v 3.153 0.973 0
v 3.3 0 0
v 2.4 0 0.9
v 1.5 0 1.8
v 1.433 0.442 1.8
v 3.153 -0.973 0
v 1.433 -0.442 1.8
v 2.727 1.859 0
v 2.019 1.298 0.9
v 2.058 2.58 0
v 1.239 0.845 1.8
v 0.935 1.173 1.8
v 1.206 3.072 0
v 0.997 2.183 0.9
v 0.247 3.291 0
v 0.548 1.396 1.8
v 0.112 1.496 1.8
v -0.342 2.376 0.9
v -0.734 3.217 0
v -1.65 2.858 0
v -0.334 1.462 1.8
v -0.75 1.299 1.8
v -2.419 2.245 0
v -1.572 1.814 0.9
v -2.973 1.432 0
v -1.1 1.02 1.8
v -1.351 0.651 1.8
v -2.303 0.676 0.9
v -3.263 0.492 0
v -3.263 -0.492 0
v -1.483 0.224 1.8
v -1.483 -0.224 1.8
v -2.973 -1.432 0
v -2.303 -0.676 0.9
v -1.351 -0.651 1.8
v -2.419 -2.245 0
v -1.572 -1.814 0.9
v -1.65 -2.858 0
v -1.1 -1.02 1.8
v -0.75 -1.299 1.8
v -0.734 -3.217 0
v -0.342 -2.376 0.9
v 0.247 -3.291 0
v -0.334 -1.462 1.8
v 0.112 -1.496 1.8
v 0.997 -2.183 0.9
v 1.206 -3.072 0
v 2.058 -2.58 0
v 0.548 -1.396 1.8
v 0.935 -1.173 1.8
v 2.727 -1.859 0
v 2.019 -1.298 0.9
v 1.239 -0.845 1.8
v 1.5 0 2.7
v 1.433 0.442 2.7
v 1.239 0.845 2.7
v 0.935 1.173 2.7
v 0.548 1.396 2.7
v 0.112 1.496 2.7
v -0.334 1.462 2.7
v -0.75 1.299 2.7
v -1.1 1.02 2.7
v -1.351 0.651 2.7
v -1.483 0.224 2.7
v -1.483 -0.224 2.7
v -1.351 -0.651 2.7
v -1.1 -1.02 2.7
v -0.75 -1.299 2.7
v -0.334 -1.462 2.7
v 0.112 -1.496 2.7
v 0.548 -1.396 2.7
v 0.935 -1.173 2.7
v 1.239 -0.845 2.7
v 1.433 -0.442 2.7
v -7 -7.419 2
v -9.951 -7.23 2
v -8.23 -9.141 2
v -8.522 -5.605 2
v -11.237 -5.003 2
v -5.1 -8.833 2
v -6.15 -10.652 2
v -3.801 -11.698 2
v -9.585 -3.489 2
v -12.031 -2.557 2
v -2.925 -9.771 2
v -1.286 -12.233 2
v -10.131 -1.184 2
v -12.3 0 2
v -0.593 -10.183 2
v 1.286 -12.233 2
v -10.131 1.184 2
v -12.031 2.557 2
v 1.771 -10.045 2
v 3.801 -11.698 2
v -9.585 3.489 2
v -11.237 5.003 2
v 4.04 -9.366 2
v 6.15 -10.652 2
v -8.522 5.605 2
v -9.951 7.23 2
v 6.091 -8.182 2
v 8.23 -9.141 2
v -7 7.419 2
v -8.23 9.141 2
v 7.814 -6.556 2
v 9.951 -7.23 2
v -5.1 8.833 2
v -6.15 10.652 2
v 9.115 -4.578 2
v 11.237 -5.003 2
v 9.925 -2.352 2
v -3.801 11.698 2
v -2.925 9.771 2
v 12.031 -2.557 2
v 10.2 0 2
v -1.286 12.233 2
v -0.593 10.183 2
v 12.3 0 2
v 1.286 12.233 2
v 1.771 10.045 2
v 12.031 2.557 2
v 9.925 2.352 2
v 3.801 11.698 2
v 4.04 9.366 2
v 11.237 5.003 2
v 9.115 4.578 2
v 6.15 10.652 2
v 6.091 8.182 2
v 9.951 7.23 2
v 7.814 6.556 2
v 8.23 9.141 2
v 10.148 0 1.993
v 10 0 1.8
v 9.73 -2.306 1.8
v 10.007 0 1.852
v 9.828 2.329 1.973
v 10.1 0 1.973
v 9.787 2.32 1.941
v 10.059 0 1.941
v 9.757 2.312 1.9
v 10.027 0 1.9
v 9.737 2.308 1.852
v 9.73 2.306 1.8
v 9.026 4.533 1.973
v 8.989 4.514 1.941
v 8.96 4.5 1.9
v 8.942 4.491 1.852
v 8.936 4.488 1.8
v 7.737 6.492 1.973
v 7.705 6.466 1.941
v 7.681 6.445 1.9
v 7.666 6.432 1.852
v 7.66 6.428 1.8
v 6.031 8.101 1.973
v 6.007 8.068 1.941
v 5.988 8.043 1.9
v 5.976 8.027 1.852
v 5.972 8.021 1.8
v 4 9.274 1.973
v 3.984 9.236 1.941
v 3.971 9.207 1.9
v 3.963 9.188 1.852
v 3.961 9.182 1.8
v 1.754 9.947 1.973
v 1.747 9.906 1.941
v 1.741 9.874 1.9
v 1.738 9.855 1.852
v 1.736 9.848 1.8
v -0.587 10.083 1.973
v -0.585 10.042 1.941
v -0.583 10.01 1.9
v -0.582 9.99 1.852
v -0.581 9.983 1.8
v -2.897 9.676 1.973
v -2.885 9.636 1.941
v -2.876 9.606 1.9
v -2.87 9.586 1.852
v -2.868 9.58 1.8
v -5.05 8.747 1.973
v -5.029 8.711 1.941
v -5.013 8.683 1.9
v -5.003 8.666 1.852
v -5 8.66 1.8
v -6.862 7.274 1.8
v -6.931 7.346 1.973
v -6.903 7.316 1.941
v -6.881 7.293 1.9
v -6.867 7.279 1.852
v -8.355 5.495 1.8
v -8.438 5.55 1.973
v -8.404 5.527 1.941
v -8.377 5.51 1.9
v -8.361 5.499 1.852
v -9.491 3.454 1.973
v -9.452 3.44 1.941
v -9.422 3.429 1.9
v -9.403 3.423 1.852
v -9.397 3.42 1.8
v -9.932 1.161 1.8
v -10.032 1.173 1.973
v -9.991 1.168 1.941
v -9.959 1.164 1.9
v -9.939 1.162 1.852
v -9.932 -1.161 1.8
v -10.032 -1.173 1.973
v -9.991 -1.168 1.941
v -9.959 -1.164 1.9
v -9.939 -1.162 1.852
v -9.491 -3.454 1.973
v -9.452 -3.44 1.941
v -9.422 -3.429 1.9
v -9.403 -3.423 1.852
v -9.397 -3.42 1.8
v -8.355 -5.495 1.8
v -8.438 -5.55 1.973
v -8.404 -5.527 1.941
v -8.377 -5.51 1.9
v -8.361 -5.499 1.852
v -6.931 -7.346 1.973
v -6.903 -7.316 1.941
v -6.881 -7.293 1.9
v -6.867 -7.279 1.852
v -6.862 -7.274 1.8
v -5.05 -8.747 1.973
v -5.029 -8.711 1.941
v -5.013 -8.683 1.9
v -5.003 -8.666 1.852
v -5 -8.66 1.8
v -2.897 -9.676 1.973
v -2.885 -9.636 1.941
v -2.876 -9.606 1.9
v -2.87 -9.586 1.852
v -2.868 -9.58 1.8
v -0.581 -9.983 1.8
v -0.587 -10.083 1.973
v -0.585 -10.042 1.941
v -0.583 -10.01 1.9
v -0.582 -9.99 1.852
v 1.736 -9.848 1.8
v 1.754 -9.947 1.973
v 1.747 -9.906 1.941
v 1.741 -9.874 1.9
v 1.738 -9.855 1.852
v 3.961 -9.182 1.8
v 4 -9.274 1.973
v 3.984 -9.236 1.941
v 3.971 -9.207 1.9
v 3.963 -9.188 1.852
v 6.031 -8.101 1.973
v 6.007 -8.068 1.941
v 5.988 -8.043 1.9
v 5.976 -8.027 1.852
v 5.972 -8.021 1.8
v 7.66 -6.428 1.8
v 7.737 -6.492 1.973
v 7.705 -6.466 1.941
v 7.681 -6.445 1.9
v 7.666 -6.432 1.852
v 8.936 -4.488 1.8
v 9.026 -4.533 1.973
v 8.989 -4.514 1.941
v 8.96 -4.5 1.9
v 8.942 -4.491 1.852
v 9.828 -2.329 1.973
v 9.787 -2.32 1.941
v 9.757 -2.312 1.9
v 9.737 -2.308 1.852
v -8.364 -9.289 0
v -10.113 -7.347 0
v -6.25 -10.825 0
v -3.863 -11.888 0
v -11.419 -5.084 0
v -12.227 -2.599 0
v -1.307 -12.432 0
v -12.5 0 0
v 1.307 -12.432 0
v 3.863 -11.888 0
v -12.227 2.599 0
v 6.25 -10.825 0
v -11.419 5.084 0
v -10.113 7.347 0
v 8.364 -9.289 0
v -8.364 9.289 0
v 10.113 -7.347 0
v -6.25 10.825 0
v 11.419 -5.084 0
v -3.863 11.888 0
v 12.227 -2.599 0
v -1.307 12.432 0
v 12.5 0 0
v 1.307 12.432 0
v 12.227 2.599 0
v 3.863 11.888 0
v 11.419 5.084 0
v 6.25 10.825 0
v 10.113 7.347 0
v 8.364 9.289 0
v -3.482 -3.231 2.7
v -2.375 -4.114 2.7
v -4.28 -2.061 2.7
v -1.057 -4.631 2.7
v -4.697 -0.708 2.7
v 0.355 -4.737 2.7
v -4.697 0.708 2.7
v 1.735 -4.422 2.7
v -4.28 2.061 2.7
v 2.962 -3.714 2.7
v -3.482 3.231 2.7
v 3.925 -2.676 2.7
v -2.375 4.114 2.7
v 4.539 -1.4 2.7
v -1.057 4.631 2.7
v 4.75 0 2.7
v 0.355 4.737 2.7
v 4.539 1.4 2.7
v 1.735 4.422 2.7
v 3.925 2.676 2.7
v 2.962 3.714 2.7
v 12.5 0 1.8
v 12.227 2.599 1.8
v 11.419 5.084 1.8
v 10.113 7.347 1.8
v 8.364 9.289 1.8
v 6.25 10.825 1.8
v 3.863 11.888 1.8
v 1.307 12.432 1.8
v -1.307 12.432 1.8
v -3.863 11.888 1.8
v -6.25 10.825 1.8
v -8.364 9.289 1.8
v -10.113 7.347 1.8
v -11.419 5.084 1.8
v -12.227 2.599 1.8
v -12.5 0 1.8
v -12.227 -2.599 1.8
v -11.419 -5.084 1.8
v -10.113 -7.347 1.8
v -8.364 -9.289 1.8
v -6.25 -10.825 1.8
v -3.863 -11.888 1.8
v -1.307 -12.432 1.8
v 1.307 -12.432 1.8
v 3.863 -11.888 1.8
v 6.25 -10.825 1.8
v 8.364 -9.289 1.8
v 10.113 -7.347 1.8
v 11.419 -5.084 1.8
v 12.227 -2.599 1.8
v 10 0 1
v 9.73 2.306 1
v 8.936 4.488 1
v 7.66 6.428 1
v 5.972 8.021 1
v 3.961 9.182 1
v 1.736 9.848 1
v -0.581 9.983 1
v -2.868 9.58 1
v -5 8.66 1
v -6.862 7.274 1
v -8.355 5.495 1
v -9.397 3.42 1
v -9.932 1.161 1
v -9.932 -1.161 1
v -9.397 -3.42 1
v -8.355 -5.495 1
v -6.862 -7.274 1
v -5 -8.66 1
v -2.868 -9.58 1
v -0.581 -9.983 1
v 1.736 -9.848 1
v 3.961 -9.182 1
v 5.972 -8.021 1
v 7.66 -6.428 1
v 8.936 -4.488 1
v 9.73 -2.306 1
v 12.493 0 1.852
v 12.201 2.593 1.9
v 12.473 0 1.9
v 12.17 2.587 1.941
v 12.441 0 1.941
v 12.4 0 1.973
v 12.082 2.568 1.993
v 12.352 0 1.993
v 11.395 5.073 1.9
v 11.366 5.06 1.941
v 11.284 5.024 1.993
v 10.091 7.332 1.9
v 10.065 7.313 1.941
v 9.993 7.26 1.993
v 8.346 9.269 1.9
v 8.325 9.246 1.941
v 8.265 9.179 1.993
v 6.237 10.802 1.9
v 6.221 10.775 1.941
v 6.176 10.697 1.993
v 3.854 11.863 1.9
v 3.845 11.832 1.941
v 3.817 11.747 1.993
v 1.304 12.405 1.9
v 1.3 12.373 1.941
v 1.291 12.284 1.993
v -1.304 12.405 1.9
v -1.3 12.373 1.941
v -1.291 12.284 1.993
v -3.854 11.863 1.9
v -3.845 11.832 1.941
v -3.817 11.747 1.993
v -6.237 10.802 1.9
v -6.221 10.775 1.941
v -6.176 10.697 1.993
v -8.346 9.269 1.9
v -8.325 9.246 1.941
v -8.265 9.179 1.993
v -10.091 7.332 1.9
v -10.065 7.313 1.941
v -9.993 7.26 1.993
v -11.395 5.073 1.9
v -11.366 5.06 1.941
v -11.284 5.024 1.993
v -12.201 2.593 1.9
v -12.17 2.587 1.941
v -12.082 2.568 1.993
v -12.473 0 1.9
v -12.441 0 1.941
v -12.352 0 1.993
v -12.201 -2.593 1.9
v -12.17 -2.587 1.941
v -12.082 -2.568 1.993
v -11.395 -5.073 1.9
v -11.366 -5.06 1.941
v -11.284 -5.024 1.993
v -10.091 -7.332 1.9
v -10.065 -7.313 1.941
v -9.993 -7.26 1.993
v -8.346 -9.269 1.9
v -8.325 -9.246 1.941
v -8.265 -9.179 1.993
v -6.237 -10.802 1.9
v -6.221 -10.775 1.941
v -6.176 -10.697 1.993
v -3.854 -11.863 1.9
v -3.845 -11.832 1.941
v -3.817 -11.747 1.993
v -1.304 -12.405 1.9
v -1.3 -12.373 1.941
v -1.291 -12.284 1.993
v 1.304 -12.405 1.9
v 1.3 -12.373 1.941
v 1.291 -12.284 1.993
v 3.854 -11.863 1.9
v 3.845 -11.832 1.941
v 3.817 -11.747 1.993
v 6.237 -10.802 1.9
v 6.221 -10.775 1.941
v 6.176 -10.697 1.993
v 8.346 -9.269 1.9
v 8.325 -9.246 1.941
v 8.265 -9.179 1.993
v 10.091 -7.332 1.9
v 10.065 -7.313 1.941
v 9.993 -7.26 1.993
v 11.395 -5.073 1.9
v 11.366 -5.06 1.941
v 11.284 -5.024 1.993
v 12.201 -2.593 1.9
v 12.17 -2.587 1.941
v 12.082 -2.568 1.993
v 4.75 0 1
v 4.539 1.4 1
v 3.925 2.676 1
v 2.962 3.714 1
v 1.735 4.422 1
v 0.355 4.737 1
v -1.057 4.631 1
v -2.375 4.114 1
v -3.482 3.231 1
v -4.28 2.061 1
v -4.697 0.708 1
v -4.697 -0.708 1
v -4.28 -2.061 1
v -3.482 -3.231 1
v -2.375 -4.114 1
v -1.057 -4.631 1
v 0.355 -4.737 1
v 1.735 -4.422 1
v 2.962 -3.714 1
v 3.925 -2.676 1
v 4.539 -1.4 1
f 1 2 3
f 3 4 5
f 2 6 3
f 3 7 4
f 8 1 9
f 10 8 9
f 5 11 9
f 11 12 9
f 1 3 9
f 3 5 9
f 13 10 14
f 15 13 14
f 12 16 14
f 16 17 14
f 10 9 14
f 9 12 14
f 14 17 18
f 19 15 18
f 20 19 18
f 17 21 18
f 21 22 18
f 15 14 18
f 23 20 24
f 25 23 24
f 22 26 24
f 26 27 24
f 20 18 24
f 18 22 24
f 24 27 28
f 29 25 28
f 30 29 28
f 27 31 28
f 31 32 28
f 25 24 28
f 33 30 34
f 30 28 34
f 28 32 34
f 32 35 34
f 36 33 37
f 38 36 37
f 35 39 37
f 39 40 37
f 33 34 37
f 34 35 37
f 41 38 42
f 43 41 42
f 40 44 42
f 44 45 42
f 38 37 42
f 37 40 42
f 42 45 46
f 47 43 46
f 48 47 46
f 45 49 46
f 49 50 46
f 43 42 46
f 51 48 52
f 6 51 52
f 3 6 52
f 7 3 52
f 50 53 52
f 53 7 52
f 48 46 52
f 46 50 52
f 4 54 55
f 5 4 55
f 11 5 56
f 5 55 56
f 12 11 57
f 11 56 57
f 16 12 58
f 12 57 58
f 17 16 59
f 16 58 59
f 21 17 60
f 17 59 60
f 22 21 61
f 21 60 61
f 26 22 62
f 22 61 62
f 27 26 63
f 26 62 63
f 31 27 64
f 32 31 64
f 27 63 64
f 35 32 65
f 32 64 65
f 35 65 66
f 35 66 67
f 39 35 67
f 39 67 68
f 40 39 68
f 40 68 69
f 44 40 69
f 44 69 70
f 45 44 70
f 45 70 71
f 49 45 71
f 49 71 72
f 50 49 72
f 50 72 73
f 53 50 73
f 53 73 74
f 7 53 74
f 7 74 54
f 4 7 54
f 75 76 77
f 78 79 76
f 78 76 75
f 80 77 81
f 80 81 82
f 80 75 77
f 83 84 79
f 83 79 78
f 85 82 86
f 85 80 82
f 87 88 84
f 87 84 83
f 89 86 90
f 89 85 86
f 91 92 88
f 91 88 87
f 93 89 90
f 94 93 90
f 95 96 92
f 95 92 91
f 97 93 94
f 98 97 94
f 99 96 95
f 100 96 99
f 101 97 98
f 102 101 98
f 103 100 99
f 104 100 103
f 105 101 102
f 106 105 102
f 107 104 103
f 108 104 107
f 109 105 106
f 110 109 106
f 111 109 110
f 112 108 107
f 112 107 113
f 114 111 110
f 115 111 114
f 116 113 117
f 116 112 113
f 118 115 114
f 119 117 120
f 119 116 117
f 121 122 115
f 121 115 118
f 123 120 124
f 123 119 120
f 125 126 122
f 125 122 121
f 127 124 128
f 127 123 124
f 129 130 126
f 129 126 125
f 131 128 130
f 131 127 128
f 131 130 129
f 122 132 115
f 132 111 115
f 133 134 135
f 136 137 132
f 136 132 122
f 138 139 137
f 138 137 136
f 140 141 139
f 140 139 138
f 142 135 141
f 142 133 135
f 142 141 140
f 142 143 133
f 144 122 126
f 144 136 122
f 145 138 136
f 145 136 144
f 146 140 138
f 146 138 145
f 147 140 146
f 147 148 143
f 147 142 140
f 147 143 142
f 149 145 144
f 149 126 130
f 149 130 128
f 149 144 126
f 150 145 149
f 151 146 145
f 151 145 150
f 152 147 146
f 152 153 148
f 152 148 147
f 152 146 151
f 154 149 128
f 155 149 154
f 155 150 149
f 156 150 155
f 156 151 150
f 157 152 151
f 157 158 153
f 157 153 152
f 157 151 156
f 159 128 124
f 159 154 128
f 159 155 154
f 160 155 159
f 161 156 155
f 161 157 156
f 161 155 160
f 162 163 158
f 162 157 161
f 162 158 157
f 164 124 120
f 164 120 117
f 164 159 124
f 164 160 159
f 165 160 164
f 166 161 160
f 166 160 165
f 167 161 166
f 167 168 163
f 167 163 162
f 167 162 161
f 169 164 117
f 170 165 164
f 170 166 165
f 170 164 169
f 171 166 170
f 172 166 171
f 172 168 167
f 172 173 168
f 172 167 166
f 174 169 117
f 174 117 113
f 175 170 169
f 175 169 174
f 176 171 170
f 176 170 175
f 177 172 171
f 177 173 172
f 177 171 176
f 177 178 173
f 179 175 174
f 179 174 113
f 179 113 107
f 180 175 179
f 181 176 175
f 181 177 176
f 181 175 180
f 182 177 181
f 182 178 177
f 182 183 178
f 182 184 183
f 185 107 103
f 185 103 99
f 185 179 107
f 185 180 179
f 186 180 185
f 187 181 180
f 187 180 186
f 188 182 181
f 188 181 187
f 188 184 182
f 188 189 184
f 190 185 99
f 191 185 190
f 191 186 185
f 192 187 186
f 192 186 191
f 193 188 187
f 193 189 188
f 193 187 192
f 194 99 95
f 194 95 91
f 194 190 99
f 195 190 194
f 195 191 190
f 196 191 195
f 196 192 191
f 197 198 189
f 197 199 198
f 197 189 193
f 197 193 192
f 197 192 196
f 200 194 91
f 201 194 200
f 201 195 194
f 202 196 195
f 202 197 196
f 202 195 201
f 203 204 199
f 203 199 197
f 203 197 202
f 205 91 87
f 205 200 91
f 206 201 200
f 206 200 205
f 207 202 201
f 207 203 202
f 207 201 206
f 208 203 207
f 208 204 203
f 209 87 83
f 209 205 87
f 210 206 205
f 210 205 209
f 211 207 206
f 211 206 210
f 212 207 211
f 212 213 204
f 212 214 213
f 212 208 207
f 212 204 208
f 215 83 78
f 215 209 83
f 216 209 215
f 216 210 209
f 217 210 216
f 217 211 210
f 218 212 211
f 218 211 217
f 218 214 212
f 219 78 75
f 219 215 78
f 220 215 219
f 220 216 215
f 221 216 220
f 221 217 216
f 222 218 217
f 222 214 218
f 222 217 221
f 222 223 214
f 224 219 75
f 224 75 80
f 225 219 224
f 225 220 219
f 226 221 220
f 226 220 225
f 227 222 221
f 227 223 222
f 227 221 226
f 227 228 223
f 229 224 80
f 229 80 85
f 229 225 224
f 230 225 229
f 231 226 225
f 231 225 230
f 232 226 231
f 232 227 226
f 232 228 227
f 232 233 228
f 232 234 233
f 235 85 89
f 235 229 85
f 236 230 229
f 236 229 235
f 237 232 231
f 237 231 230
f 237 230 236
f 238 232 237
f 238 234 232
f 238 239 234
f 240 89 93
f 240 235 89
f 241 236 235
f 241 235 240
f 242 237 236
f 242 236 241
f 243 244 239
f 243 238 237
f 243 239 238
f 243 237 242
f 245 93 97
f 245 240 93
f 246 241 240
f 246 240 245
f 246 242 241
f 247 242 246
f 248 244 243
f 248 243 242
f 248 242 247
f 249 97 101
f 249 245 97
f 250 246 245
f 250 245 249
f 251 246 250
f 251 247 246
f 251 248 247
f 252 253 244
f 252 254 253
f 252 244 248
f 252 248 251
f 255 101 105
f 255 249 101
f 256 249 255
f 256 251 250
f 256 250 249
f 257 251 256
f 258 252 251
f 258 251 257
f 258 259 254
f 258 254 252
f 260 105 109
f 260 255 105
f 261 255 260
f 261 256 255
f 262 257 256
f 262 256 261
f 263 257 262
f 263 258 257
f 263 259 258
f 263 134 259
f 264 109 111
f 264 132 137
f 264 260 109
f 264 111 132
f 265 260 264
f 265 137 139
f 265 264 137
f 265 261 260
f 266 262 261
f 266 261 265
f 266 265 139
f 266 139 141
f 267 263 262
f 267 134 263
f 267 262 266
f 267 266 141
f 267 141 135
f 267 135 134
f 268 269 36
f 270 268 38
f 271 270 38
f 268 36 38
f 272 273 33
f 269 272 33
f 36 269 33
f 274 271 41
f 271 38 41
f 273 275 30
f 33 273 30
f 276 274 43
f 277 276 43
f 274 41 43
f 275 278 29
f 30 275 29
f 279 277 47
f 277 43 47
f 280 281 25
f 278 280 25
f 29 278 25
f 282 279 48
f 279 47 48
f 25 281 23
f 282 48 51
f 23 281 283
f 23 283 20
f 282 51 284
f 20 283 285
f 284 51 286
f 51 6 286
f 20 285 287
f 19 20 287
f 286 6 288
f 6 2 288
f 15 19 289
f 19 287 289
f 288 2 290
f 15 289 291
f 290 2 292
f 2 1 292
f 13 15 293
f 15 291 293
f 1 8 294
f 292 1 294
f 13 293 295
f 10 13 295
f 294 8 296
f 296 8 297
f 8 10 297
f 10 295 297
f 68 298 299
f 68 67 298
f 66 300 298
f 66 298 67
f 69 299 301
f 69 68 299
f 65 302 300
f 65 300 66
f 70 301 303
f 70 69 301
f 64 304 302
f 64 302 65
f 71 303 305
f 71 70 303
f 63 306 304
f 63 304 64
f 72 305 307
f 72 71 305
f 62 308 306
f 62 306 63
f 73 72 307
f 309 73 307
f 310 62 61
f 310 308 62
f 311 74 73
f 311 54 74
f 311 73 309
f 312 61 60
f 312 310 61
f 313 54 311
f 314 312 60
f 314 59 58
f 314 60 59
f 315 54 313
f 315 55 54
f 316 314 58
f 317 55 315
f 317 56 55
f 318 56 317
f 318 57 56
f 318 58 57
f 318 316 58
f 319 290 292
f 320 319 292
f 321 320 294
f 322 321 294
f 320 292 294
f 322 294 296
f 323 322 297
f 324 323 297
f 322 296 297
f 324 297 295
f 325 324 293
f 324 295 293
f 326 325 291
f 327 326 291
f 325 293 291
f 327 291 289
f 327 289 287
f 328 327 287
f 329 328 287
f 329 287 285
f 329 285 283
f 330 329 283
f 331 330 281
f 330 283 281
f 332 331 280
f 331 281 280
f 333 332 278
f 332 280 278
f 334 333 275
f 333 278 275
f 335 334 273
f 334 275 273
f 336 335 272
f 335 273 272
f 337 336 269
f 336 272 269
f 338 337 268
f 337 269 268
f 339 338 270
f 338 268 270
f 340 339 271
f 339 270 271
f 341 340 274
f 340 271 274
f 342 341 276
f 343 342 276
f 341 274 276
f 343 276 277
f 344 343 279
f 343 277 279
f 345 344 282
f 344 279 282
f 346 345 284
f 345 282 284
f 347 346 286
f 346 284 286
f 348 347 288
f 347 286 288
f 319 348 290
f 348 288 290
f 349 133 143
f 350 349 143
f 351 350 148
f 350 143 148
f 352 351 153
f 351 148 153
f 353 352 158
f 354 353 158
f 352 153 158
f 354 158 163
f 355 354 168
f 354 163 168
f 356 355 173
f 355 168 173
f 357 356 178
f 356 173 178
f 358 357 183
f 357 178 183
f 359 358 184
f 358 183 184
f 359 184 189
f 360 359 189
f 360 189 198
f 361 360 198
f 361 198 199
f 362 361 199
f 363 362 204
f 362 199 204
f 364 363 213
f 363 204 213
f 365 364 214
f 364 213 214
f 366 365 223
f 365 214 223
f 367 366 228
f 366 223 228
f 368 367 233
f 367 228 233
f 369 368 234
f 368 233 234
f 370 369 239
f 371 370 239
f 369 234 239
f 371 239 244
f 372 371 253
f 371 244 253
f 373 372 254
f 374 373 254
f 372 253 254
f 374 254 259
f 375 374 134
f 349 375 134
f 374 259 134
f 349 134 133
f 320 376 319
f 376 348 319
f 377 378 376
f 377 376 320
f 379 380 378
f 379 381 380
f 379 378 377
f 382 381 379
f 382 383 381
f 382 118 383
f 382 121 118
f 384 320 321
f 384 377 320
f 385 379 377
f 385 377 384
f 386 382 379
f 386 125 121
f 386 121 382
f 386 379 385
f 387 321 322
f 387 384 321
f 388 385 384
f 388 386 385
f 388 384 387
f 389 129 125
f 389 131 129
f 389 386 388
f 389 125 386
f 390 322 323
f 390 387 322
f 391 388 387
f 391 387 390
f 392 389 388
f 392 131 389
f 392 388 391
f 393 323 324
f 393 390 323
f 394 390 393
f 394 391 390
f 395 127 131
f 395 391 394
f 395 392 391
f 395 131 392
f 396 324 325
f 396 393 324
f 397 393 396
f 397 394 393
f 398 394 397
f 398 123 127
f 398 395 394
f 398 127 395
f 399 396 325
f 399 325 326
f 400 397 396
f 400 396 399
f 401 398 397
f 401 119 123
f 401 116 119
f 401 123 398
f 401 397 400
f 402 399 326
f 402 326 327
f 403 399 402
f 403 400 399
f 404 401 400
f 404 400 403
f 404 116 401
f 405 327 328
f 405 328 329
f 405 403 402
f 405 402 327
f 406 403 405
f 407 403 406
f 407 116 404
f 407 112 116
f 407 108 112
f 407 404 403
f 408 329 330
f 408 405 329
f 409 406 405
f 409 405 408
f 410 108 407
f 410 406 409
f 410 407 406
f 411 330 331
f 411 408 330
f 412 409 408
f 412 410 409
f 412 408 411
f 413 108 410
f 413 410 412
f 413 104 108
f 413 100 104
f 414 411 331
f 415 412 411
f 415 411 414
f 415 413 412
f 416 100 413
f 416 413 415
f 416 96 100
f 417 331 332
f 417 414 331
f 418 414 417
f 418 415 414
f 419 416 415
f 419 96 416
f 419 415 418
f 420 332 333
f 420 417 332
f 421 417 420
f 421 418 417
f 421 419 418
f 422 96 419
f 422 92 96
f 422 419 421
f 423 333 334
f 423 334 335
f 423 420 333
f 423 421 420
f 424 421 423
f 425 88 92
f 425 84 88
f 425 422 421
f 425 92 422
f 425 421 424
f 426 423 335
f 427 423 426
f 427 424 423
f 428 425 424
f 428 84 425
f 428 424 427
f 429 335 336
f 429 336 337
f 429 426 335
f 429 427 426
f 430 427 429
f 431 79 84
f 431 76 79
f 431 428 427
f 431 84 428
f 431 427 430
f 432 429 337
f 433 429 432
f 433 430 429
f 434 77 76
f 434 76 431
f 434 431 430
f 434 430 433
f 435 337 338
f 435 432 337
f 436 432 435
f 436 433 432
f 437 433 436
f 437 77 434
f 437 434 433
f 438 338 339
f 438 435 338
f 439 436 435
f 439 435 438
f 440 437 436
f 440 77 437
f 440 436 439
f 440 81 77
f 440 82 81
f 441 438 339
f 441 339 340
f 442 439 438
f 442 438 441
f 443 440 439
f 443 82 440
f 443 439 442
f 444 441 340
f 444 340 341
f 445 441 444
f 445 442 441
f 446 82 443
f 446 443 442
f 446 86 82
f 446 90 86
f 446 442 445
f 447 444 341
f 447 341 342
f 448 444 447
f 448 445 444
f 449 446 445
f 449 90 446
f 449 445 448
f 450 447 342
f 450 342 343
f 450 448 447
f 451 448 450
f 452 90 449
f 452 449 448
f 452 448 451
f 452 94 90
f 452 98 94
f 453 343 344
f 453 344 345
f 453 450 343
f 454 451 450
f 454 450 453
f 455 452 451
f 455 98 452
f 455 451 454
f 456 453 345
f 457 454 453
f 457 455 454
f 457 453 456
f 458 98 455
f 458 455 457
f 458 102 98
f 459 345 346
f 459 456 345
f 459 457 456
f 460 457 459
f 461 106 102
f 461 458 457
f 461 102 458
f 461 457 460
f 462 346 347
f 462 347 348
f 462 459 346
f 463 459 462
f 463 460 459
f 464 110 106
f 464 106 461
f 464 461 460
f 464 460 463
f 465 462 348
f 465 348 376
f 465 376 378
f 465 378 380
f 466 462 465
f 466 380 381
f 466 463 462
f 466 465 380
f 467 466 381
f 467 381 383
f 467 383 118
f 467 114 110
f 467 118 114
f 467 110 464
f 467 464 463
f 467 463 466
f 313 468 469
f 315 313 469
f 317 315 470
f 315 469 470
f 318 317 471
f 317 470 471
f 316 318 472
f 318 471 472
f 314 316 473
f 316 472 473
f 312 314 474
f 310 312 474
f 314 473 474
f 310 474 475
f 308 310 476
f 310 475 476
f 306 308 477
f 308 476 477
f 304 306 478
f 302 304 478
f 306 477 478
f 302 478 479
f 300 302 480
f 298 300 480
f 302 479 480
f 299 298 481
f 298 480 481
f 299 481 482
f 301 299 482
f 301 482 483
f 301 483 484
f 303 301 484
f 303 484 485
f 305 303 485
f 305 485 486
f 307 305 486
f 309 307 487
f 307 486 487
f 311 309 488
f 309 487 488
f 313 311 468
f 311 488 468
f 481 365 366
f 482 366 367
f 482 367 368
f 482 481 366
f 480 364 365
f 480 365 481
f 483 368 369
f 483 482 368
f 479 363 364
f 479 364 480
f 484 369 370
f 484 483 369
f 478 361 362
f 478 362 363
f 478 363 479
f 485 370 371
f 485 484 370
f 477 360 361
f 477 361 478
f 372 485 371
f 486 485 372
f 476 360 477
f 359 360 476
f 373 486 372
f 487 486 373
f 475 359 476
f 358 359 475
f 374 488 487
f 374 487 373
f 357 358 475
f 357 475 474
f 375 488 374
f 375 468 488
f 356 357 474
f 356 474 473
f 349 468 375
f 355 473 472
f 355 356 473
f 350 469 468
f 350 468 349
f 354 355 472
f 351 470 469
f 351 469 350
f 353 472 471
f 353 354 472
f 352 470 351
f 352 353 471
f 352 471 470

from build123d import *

# Parameters (mm, degrees)
F0_R     = 12.5
F1_DEPTH = 2
F2_R     = 10
F3_DEPTH = 1
F4_R     = 4.75
F5_DEPTH = 1.7
F6_R     = 1.5
F7_DEPTH = 25
F8_SIZE  = 1.8
F9_R     = 0.2


with BuildPart() as f1:
    # F0 (on Top) → F1 (new body)
    with BuildSketch(Plane.XY):
        Circle(F0_R)
    extrude(amount=F1_DEPTH)

    # F2 (on face) → F3 (cut)
    with BuildSketch(Plane.XY.offset(2)):
        Circle(F2_R)
    extrude(amount=-F3_DEPTH, mode=Mode.SUBTRACT)

    # F4 (on face) → F5 (join)
    with BuildSketch(Plane.XY.offset(1)):
        Circle(F4_R)
    extrude(amount=F5_DEPTH)

    # F6 (on face) → F7 (cut)
    with BuildSketch(Plane.XY.offset(2.7)):
        Circle(F6_R)
    extrude(amount=-F7_DEPTH, mode=Mode.SUBTRACT)

    # F8
    f8_edges = [f1.edges().sort_by_distance(p)[0] for p in [
        (-1.5, 0, 0),
    ]]
    chamfer(f8_edges, length=F8_SIZE)

    # F9
    f9_edges = [f1.edges().sort_by_distance(p)[0] for p in [
        (-12.5, 0, 2),
        (-10, 0, 2),
    ]]
    fillet(f9_edges, radius=F9_R)


solid = f1.part
